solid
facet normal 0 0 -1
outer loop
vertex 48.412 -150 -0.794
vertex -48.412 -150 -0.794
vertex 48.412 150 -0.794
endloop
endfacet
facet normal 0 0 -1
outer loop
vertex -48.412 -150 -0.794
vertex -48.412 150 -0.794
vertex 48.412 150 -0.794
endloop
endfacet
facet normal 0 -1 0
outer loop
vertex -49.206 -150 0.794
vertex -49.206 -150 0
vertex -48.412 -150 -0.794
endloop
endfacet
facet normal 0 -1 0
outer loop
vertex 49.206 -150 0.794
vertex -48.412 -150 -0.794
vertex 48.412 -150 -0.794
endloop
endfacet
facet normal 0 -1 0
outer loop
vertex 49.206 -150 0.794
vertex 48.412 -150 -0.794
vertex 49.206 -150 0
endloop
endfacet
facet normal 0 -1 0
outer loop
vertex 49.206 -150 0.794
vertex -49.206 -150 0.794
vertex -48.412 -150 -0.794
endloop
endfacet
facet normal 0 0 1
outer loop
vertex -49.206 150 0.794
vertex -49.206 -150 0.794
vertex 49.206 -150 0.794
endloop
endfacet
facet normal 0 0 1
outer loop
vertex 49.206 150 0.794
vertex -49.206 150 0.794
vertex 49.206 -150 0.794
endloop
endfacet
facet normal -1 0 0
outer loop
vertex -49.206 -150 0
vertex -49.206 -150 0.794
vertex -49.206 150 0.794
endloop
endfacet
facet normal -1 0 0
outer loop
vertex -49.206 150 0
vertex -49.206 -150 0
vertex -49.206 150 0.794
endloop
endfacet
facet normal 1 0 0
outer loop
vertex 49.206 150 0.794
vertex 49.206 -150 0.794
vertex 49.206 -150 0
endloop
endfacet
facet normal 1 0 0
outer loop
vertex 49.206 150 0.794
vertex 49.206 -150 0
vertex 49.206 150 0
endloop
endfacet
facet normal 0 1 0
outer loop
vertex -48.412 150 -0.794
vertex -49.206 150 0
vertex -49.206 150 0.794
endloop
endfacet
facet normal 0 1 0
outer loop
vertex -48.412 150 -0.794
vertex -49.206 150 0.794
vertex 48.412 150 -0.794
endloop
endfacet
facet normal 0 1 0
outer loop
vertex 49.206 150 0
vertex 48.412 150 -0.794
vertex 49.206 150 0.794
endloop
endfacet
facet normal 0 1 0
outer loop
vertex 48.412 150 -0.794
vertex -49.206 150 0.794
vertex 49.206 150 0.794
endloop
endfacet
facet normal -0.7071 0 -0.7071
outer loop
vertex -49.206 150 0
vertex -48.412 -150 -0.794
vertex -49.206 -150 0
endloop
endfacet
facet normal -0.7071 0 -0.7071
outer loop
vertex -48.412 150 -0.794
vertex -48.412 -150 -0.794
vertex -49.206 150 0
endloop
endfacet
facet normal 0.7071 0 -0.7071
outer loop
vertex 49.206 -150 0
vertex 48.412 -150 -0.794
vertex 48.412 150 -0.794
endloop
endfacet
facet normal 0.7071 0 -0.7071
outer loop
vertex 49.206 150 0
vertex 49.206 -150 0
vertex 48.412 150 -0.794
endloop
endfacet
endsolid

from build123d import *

# Parameters (mm, degrees)
SKETCH1_W           = 98.4125
SKETCH1_H           = 300
BOSS_EXTRUDE1_DEPTH = 0.79375
CHAMFER1_SIZE       = 0.79375


with BuildPart() as part:
    # Sketch1 → Boss-Extrude1 (new body, symmetric)
    with BuildSketch(Plane.XY):
        Rectangle(SKETCH1_W, SKETCH1_H)
    extrude(amount=BOSS_EXTRUDE1_DEPTH, both=True)

    # Chamfer1
    chamfer1_edges = [part.edges().sort_by_distance(p)[0] for p in [
        (49.20625, 0, -0.79375),
        (-49.20625, 0, -0.79375),
    ]]
    chamfer(chamfer1_edges, length=CHAMFER1_SIZE)


solid = part.part
